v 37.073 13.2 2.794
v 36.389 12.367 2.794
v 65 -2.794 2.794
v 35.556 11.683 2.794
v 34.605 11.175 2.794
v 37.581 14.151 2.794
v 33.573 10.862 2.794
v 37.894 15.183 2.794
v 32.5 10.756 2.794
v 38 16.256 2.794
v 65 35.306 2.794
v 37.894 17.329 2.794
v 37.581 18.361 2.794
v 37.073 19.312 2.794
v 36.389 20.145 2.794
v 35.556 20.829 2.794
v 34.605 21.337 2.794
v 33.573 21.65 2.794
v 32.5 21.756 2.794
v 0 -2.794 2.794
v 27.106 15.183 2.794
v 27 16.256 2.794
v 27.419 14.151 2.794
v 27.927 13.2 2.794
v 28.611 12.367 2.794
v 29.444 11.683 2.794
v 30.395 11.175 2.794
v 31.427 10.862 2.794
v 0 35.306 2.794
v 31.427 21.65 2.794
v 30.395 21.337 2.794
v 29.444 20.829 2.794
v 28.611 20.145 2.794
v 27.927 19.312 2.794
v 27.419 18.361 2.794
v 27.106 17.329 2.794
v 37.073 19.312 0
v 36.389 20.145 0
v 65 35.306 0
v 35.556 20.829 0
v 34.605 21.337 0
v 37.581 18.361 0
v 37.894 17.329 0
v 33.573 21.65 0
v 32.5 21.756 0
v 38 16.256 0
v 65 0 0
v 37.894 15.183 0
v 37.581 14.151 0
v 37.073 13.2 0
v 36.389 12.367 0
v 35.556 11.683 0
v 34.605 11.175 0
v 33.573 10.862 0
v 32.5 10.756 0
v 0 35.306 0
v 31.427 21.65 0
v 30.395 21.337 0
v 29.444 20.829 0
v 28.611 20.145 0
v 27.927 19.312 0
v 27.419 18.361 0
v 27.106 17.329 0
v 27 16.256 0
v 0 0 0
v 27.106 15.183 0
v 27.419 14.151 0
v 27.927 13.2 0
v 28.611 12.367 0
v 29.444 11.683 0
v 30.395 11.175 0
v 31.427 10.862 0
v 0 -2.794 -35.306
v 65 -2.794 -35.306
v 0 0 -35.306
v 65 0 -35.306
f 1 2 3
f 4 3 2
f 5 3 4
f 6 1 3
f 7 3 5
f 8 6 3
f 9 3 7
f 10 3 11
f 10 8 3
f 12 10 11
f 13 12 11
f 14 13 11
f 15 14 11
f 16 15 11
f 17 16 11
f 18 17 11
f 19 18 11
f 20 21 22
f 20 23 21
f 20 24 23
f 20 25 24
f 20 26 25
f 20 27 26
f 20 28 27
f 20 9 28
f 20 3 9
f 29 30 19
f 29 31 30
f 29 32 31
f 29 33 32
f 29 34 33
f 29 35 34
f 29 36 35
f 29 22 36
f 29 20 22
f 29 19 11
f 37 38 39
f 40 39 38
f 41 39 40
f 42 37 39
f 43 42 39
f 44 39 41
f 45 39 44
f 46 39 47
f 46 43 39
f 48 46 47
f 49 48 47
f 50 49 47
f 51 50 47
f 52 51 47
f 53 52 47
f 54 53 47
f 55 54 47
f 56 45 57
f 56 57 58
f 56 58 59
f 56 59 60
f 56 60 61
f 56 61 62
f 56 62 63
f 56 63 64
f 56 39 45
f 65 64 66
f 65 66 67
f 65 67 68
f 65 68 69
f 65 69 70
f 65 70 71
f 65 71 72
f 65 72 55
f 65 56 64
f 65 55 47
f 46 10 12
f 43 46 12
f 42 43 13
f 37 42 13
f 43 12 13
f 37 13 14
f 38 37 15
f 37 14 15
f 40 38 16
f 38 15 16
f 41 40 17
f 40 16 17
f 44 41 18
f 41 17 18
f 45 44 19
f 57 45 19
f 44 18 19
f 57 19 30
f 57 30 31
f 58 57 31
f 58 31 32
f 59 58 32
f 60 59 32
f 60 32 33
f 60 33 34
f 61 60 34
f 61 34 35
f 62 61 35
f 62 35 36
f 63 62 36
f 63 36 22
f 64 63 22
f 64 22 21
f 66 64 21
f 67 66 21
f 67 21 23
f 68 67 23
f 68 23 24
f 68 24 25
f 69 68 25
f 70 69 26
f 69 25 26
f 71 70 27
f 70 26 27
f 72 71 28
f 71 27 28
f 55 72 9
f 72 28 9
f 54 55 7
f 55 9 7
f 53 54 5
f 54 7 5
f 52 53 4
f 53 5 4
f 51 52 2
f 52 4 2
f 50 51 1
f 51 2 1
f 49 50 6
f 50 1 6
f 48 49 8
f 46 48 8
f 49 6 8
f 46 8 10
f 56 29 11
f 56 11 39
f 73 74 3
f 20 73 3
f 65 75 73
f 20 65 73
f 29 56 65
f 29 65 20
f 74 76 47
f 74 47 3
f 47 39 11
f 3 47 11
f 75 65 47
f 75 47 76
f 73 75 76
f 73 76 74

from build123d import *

# Parameters (mm, degrees)
BOSS_EXTRUDE1_DEPTH = 65
SKETCH2_R           = 5.5
CUT_EXTRUDE1_DEPTH  = 65


with BuildPart() as part:
    # Sketch1 → Boss-Extrude1 (new body)
    with BuildSketch(Plane(origin=(0, 0, 0), x_dir=(0, 0, -1), z_dir=(1, 0, 0))):
        Polygon((0, 35.306), (0, 0), (35.306, 0), (35.306, -2.794), (-2.794, -2.794), (-2.794, 35.306), align=None)
    extrude(amount=BOSS_EXTRUDE1_DEPTH)

    # Sketch2 → Cut-Extrude1 (cut)
    with BuildSketch(Plane.XY.offset(2.794)):
        with Locations((32.5, 16.256)):
            Circle(SKETCH2_R)
    extrude(amount=-CUT_EXTRUDE1_DEPTH, mode=Mode.SUBTRACT)


solid = part.part
